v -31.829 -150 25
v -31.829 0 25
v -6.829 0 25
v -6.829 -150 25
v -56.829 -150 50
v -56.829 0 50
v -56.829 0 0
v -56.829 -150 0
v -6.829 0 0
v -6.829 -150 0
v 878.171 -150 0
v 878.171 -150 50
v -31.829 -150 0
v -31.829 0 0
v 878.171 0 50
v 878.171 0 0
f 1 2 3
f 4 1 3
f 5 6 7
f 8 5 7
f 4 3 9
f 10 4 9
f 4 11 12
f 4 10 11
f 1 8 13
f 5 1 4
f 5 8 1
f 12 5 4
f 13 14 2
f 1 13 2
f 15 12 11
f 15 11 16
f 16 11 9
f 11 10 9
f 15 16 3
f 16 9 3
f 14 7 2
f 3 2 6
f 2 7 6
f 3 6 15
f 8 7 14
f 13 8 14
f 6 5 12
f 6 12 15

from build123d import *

# Parameters (mm, degrees)
F0_W     = 25
F0_H     = 25
F1_DEPTH = 150
F2_DEPTH = 150
F3_W     = 150
F3_H     = 50
F4_DEPTH = 810


with BuildPart() as f1:
    # F0 (on Front) → F1 (new body)
    with BuildSketch(Plane.XZ):
        Polygon((68.171213, 0), (68.171213, 50), (-31.828787, 50), (-31.828787, 25), (-6.828787, 25), (-6.828787, 0), align=None)
        with Locations((-44.328787, 37.5)):
            Rectangle(F0_W, F0_H)
        with Locations((-44.328787, 12.5)):
            Rectangle(F0_W, F0_H)
    extrude(amount=F1_DEPTH)

    # F0 (on Front) → F2 (join)
    with BuildSketch(Plane.XZ):
        Polygon((68.171213, 0), (68.171213, 50), (-31.828787, 50), (-31.828787, 25), (-6.828787, 25), (-6.828787, 0), align=None)
        with Locations((-44.328787, 37.5)):
            Rectangle(F0_W, F0_H)
        with Locations((-44.328787, 12.5)):
            Rectangle(F0_W, F0_H)
    extrude(amount=F2_DEPTH)

    # F3 (on face) → F4 (join)
    with BuildSketch(Plane.YZ.offset(68.171213)):
        with Locations((-75, 25)):
            Rectangle(F3_W, F3_H)
    extrude(amount=F4_DEPTH)


solid = f1.part
